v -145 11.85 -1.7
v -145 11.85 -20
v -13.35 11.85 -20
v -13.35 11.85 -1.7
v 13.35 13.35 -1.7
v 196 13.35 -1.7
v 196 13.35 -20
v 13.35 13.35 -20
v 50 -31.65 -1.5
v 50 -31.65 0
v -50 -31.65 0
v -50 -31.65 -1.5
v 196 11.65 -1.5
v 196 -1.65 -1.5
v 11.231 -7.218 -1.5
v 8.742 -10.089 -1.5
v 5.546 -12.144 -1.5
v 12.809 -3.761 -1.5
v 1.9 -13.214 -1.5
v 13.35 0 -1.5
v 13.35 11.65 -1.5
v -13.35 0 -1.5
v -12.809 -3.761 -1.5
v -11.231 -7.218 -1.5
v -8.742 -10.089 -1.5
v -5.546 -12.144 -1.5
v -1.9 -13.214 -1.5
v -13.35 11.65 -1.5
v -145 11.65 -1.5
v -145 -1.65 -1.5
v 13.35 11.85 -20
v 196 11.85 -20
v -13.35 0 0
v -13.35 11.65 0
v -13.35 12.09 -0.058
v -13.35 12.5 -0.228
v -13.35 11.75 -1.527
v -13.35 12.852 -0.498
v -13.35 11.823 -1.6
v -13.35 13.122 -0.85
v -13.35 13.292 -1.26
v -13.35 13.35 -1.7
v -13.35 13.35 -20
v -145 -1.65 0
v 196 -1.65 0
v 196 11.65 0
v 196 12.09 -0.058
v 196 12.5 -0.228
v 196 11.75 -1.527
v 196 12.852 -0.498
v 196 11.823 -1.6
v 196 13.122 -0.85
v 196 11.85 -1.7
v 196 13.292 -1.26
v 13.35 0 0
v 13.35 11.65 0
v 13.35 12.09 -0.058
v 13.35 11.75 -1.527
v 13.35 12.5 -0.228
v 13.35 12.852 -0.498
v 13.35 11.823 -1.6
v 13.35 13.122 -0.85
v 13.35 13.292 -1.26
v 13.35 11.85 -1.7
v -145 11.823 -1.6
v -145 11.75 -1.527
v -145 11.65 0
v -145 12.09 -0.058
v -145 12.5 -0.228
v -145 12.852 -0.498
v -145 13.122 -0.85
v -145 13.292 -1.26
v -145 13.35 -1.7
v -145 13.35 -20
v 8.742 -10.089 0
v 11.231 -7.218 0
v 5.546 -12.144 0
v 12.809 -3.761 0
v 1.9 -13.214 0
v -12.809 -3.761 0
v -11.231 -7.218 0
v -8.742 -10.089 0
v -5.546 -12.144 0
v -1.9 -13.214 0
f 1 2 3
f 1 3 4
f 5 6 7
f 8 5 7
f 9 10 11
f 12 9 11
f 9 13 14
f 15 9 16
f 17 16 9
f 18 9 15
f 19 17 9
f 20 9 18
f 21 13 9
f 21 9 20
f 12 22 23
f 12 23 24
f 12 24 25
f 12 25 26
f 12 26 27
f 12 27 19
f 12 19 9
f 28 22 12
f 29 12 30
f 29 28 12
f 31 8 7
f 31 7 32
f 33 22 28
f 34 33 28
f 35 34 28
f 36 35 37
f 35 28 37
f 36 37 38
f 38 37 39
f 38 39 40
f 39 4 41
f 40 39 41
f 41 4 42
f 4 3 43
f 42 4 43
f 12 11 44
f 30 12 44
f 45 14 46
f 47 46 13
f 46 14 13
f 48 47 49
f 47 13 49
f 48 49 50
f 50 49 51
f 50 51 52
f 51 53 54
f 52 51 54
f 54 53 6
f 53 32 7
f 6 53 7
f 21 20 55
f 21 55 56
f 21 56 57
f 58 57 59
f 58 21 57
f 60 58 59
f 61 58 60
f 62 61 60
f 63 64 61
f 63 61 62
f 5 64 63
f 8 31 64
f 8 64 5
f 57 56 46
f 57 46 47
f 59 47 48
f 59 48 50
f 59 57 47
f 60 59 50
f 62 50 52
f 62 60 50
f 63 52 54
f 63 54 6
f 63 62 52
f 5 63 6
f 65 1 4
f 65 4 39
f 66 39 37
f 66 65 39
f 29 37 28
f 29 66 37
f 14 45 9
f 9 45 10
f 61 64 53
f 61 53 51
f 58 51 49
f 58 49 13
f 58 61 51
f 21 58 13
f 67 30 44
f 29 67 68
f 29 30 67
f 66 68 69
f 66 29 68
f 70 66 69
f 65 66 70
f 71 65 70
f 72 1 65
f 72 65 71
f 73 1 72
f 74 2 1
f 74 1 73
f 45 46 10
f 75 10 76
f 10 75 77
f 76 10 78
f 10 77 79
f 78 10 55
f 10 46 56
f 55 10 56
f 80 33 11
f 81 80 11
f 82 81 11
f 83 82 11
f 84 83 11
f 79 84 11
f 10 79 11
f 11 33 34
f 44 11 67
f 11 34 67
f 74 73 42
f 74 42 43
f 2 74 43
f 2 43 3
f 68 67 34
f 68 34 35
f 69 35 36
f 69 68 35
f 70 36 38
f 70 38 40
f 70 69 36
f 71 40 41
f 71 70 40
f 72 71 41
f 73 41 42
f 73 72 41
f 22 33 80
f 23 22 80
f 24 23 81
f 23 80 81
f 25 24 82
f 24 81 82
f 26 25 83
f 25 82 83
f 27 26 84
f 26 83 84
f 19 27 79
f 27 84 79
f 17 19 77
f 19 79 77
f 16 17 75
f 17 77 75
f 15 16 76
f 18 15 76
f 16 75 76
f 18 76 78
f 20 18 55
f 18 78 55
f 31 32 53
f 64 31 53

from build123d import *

# Parameters (mm, degrees)
BASE_FLANGE1_DEPTH             = 1.5
EDGE_FLANGE1_STRIP_W           = 6.4
EDGE_FLANGE1_STRIP_H           = 1.5
EDGE_FLANGE1_STRIP_CUT_DEPTH   = 131.65
EDGE_FLANGE1_STRIP_2_W         = 6.4
EDGE_FLANGE1_STRIP_2_H         = 1.5
EDGE_FLANGE1_STRIP_CUT_2_DEPTH = 182.65
EDGE_FLANGE1_DEPTH             = 131.65
EDGE_FLANGE1_BEND_DEPTH        = 182.65


# Sheet-metal steps are written as plain solids
with BuildPart() as part:
    # Sketch1 → Base-Flange1 (new body)
    with BuildSketch(Plane.XY):
        with BuildLine():
            Line((13.35, 0), (13.35, 13.35))
            Line((13.35, 13.35), (196, 13.35))
            Line((196, 13.35), (196, -1.65))
            Line((196, -1.65), (50, -31.65))
            Line((50, -31.65), (-50, -31.65))
            Line((-50, -31.65), (-145, -1.65))
            Line((-145, -1.65), (-145, 13.35))
            Line((-145, 13.35), (-13.35, 13.35))
            Line((-13.35, 13.35), (-13.35, 0))
            ThreePointArc((-13.35, 0), (0, -13.35), (13.35, 0))
        make_face()
    extrude(amount=-BASE_FLANGE1_DEPTH)

    # Edge-Flange1 strip (across the edge) → Edge-Flange1 strip cut (cut)
    with BuildSketch(Plane(origin=(-145, 13.35, -1.5), x_dir=(0, -1, 0), z_dir=(1, 0, 0))):
        with Locations((-1.5, -0.75)):
            Rectangle(EDGE_FLANGE1_STRIP_W, EDGE_FLANGE1_STRIP_H)
    extrude(amount=EDGE_FLANGE1_STRIP_CUT_DEPTH, mode=Mode.SUBTRACT)

    # Edge-Flange1 strip 2 (across the edge) → Edge-Flange1 strip cut 2 (cut)
    with BuildSketch(Plane(origin=(13.35, 13.35, -1.5), x_dir=(0, -1, 0), z_dir=(1, 0, 0))):
        with Locations((-1.5, -0.75)):
            Rectangle(EDGE_FLANGE1_STRIP_2_W, EDGE_FLANGE1_STRIP_2_H)
    extrude(amount=EDGE_FLANGE1_STRIP_CUT_2_DEPTH, mode=Mode.SUBTRACT)

    # Edge-Flange1 section (across the edge) → Edge-Flange1 (add)
    with BuildSketch(Plane(origin=(-145, 13.35, -1.5), x_dir=(0, -1, 0), z_dir=(1, 0, 0))):
        with BuildLine():
            Line((0, 0.2), (0, 18.5))
            Line((0, 18.5), (1.5, 18.5))
            Line((1.5, 18.5), (1.5, 0.2))
            ThreePointArc((1.5, 0.2), (1.558578644, 0.058578644), (1.7, 0))
            Line((1.7, 0), (1.7, -1.5))
            ThreePointArc((1.7, -1.5), (0.497918472, -1.002081528), (0, 0.2))
        make_face()
    extrude(amount=EDGE_FLANGE1_DEPTH)

    # Edge-Flange1 section 2 (across the edge) → Edge-Flange1 bend (add)
    with BuildSketch(Plane(origin=(13.35, 13.35, -1.5), x_dir=(0, -1, 0), z_dir=(1, 0, 0))):
        with BuildLine():
            Line((0, 0.2), (0, 18.5))
            Line((0, 18.5), (1.5, 18.5))
            Line((1.5, 18.5), (1.5, 0.2))
            ThreePointArc((1.5, 0.2), (1.558578644, 0.058578644), (1.7, 0))
            Line((1.7, 0), (1.7, -1.5))
            ThreePointArc((1.7, -1.5), (0.497918472, -1.002081528), (0, 0.2))
        make_face()
    extrude(amount=EDGE_FLANGE1_BEND_DEPTH)


solid = part.part
